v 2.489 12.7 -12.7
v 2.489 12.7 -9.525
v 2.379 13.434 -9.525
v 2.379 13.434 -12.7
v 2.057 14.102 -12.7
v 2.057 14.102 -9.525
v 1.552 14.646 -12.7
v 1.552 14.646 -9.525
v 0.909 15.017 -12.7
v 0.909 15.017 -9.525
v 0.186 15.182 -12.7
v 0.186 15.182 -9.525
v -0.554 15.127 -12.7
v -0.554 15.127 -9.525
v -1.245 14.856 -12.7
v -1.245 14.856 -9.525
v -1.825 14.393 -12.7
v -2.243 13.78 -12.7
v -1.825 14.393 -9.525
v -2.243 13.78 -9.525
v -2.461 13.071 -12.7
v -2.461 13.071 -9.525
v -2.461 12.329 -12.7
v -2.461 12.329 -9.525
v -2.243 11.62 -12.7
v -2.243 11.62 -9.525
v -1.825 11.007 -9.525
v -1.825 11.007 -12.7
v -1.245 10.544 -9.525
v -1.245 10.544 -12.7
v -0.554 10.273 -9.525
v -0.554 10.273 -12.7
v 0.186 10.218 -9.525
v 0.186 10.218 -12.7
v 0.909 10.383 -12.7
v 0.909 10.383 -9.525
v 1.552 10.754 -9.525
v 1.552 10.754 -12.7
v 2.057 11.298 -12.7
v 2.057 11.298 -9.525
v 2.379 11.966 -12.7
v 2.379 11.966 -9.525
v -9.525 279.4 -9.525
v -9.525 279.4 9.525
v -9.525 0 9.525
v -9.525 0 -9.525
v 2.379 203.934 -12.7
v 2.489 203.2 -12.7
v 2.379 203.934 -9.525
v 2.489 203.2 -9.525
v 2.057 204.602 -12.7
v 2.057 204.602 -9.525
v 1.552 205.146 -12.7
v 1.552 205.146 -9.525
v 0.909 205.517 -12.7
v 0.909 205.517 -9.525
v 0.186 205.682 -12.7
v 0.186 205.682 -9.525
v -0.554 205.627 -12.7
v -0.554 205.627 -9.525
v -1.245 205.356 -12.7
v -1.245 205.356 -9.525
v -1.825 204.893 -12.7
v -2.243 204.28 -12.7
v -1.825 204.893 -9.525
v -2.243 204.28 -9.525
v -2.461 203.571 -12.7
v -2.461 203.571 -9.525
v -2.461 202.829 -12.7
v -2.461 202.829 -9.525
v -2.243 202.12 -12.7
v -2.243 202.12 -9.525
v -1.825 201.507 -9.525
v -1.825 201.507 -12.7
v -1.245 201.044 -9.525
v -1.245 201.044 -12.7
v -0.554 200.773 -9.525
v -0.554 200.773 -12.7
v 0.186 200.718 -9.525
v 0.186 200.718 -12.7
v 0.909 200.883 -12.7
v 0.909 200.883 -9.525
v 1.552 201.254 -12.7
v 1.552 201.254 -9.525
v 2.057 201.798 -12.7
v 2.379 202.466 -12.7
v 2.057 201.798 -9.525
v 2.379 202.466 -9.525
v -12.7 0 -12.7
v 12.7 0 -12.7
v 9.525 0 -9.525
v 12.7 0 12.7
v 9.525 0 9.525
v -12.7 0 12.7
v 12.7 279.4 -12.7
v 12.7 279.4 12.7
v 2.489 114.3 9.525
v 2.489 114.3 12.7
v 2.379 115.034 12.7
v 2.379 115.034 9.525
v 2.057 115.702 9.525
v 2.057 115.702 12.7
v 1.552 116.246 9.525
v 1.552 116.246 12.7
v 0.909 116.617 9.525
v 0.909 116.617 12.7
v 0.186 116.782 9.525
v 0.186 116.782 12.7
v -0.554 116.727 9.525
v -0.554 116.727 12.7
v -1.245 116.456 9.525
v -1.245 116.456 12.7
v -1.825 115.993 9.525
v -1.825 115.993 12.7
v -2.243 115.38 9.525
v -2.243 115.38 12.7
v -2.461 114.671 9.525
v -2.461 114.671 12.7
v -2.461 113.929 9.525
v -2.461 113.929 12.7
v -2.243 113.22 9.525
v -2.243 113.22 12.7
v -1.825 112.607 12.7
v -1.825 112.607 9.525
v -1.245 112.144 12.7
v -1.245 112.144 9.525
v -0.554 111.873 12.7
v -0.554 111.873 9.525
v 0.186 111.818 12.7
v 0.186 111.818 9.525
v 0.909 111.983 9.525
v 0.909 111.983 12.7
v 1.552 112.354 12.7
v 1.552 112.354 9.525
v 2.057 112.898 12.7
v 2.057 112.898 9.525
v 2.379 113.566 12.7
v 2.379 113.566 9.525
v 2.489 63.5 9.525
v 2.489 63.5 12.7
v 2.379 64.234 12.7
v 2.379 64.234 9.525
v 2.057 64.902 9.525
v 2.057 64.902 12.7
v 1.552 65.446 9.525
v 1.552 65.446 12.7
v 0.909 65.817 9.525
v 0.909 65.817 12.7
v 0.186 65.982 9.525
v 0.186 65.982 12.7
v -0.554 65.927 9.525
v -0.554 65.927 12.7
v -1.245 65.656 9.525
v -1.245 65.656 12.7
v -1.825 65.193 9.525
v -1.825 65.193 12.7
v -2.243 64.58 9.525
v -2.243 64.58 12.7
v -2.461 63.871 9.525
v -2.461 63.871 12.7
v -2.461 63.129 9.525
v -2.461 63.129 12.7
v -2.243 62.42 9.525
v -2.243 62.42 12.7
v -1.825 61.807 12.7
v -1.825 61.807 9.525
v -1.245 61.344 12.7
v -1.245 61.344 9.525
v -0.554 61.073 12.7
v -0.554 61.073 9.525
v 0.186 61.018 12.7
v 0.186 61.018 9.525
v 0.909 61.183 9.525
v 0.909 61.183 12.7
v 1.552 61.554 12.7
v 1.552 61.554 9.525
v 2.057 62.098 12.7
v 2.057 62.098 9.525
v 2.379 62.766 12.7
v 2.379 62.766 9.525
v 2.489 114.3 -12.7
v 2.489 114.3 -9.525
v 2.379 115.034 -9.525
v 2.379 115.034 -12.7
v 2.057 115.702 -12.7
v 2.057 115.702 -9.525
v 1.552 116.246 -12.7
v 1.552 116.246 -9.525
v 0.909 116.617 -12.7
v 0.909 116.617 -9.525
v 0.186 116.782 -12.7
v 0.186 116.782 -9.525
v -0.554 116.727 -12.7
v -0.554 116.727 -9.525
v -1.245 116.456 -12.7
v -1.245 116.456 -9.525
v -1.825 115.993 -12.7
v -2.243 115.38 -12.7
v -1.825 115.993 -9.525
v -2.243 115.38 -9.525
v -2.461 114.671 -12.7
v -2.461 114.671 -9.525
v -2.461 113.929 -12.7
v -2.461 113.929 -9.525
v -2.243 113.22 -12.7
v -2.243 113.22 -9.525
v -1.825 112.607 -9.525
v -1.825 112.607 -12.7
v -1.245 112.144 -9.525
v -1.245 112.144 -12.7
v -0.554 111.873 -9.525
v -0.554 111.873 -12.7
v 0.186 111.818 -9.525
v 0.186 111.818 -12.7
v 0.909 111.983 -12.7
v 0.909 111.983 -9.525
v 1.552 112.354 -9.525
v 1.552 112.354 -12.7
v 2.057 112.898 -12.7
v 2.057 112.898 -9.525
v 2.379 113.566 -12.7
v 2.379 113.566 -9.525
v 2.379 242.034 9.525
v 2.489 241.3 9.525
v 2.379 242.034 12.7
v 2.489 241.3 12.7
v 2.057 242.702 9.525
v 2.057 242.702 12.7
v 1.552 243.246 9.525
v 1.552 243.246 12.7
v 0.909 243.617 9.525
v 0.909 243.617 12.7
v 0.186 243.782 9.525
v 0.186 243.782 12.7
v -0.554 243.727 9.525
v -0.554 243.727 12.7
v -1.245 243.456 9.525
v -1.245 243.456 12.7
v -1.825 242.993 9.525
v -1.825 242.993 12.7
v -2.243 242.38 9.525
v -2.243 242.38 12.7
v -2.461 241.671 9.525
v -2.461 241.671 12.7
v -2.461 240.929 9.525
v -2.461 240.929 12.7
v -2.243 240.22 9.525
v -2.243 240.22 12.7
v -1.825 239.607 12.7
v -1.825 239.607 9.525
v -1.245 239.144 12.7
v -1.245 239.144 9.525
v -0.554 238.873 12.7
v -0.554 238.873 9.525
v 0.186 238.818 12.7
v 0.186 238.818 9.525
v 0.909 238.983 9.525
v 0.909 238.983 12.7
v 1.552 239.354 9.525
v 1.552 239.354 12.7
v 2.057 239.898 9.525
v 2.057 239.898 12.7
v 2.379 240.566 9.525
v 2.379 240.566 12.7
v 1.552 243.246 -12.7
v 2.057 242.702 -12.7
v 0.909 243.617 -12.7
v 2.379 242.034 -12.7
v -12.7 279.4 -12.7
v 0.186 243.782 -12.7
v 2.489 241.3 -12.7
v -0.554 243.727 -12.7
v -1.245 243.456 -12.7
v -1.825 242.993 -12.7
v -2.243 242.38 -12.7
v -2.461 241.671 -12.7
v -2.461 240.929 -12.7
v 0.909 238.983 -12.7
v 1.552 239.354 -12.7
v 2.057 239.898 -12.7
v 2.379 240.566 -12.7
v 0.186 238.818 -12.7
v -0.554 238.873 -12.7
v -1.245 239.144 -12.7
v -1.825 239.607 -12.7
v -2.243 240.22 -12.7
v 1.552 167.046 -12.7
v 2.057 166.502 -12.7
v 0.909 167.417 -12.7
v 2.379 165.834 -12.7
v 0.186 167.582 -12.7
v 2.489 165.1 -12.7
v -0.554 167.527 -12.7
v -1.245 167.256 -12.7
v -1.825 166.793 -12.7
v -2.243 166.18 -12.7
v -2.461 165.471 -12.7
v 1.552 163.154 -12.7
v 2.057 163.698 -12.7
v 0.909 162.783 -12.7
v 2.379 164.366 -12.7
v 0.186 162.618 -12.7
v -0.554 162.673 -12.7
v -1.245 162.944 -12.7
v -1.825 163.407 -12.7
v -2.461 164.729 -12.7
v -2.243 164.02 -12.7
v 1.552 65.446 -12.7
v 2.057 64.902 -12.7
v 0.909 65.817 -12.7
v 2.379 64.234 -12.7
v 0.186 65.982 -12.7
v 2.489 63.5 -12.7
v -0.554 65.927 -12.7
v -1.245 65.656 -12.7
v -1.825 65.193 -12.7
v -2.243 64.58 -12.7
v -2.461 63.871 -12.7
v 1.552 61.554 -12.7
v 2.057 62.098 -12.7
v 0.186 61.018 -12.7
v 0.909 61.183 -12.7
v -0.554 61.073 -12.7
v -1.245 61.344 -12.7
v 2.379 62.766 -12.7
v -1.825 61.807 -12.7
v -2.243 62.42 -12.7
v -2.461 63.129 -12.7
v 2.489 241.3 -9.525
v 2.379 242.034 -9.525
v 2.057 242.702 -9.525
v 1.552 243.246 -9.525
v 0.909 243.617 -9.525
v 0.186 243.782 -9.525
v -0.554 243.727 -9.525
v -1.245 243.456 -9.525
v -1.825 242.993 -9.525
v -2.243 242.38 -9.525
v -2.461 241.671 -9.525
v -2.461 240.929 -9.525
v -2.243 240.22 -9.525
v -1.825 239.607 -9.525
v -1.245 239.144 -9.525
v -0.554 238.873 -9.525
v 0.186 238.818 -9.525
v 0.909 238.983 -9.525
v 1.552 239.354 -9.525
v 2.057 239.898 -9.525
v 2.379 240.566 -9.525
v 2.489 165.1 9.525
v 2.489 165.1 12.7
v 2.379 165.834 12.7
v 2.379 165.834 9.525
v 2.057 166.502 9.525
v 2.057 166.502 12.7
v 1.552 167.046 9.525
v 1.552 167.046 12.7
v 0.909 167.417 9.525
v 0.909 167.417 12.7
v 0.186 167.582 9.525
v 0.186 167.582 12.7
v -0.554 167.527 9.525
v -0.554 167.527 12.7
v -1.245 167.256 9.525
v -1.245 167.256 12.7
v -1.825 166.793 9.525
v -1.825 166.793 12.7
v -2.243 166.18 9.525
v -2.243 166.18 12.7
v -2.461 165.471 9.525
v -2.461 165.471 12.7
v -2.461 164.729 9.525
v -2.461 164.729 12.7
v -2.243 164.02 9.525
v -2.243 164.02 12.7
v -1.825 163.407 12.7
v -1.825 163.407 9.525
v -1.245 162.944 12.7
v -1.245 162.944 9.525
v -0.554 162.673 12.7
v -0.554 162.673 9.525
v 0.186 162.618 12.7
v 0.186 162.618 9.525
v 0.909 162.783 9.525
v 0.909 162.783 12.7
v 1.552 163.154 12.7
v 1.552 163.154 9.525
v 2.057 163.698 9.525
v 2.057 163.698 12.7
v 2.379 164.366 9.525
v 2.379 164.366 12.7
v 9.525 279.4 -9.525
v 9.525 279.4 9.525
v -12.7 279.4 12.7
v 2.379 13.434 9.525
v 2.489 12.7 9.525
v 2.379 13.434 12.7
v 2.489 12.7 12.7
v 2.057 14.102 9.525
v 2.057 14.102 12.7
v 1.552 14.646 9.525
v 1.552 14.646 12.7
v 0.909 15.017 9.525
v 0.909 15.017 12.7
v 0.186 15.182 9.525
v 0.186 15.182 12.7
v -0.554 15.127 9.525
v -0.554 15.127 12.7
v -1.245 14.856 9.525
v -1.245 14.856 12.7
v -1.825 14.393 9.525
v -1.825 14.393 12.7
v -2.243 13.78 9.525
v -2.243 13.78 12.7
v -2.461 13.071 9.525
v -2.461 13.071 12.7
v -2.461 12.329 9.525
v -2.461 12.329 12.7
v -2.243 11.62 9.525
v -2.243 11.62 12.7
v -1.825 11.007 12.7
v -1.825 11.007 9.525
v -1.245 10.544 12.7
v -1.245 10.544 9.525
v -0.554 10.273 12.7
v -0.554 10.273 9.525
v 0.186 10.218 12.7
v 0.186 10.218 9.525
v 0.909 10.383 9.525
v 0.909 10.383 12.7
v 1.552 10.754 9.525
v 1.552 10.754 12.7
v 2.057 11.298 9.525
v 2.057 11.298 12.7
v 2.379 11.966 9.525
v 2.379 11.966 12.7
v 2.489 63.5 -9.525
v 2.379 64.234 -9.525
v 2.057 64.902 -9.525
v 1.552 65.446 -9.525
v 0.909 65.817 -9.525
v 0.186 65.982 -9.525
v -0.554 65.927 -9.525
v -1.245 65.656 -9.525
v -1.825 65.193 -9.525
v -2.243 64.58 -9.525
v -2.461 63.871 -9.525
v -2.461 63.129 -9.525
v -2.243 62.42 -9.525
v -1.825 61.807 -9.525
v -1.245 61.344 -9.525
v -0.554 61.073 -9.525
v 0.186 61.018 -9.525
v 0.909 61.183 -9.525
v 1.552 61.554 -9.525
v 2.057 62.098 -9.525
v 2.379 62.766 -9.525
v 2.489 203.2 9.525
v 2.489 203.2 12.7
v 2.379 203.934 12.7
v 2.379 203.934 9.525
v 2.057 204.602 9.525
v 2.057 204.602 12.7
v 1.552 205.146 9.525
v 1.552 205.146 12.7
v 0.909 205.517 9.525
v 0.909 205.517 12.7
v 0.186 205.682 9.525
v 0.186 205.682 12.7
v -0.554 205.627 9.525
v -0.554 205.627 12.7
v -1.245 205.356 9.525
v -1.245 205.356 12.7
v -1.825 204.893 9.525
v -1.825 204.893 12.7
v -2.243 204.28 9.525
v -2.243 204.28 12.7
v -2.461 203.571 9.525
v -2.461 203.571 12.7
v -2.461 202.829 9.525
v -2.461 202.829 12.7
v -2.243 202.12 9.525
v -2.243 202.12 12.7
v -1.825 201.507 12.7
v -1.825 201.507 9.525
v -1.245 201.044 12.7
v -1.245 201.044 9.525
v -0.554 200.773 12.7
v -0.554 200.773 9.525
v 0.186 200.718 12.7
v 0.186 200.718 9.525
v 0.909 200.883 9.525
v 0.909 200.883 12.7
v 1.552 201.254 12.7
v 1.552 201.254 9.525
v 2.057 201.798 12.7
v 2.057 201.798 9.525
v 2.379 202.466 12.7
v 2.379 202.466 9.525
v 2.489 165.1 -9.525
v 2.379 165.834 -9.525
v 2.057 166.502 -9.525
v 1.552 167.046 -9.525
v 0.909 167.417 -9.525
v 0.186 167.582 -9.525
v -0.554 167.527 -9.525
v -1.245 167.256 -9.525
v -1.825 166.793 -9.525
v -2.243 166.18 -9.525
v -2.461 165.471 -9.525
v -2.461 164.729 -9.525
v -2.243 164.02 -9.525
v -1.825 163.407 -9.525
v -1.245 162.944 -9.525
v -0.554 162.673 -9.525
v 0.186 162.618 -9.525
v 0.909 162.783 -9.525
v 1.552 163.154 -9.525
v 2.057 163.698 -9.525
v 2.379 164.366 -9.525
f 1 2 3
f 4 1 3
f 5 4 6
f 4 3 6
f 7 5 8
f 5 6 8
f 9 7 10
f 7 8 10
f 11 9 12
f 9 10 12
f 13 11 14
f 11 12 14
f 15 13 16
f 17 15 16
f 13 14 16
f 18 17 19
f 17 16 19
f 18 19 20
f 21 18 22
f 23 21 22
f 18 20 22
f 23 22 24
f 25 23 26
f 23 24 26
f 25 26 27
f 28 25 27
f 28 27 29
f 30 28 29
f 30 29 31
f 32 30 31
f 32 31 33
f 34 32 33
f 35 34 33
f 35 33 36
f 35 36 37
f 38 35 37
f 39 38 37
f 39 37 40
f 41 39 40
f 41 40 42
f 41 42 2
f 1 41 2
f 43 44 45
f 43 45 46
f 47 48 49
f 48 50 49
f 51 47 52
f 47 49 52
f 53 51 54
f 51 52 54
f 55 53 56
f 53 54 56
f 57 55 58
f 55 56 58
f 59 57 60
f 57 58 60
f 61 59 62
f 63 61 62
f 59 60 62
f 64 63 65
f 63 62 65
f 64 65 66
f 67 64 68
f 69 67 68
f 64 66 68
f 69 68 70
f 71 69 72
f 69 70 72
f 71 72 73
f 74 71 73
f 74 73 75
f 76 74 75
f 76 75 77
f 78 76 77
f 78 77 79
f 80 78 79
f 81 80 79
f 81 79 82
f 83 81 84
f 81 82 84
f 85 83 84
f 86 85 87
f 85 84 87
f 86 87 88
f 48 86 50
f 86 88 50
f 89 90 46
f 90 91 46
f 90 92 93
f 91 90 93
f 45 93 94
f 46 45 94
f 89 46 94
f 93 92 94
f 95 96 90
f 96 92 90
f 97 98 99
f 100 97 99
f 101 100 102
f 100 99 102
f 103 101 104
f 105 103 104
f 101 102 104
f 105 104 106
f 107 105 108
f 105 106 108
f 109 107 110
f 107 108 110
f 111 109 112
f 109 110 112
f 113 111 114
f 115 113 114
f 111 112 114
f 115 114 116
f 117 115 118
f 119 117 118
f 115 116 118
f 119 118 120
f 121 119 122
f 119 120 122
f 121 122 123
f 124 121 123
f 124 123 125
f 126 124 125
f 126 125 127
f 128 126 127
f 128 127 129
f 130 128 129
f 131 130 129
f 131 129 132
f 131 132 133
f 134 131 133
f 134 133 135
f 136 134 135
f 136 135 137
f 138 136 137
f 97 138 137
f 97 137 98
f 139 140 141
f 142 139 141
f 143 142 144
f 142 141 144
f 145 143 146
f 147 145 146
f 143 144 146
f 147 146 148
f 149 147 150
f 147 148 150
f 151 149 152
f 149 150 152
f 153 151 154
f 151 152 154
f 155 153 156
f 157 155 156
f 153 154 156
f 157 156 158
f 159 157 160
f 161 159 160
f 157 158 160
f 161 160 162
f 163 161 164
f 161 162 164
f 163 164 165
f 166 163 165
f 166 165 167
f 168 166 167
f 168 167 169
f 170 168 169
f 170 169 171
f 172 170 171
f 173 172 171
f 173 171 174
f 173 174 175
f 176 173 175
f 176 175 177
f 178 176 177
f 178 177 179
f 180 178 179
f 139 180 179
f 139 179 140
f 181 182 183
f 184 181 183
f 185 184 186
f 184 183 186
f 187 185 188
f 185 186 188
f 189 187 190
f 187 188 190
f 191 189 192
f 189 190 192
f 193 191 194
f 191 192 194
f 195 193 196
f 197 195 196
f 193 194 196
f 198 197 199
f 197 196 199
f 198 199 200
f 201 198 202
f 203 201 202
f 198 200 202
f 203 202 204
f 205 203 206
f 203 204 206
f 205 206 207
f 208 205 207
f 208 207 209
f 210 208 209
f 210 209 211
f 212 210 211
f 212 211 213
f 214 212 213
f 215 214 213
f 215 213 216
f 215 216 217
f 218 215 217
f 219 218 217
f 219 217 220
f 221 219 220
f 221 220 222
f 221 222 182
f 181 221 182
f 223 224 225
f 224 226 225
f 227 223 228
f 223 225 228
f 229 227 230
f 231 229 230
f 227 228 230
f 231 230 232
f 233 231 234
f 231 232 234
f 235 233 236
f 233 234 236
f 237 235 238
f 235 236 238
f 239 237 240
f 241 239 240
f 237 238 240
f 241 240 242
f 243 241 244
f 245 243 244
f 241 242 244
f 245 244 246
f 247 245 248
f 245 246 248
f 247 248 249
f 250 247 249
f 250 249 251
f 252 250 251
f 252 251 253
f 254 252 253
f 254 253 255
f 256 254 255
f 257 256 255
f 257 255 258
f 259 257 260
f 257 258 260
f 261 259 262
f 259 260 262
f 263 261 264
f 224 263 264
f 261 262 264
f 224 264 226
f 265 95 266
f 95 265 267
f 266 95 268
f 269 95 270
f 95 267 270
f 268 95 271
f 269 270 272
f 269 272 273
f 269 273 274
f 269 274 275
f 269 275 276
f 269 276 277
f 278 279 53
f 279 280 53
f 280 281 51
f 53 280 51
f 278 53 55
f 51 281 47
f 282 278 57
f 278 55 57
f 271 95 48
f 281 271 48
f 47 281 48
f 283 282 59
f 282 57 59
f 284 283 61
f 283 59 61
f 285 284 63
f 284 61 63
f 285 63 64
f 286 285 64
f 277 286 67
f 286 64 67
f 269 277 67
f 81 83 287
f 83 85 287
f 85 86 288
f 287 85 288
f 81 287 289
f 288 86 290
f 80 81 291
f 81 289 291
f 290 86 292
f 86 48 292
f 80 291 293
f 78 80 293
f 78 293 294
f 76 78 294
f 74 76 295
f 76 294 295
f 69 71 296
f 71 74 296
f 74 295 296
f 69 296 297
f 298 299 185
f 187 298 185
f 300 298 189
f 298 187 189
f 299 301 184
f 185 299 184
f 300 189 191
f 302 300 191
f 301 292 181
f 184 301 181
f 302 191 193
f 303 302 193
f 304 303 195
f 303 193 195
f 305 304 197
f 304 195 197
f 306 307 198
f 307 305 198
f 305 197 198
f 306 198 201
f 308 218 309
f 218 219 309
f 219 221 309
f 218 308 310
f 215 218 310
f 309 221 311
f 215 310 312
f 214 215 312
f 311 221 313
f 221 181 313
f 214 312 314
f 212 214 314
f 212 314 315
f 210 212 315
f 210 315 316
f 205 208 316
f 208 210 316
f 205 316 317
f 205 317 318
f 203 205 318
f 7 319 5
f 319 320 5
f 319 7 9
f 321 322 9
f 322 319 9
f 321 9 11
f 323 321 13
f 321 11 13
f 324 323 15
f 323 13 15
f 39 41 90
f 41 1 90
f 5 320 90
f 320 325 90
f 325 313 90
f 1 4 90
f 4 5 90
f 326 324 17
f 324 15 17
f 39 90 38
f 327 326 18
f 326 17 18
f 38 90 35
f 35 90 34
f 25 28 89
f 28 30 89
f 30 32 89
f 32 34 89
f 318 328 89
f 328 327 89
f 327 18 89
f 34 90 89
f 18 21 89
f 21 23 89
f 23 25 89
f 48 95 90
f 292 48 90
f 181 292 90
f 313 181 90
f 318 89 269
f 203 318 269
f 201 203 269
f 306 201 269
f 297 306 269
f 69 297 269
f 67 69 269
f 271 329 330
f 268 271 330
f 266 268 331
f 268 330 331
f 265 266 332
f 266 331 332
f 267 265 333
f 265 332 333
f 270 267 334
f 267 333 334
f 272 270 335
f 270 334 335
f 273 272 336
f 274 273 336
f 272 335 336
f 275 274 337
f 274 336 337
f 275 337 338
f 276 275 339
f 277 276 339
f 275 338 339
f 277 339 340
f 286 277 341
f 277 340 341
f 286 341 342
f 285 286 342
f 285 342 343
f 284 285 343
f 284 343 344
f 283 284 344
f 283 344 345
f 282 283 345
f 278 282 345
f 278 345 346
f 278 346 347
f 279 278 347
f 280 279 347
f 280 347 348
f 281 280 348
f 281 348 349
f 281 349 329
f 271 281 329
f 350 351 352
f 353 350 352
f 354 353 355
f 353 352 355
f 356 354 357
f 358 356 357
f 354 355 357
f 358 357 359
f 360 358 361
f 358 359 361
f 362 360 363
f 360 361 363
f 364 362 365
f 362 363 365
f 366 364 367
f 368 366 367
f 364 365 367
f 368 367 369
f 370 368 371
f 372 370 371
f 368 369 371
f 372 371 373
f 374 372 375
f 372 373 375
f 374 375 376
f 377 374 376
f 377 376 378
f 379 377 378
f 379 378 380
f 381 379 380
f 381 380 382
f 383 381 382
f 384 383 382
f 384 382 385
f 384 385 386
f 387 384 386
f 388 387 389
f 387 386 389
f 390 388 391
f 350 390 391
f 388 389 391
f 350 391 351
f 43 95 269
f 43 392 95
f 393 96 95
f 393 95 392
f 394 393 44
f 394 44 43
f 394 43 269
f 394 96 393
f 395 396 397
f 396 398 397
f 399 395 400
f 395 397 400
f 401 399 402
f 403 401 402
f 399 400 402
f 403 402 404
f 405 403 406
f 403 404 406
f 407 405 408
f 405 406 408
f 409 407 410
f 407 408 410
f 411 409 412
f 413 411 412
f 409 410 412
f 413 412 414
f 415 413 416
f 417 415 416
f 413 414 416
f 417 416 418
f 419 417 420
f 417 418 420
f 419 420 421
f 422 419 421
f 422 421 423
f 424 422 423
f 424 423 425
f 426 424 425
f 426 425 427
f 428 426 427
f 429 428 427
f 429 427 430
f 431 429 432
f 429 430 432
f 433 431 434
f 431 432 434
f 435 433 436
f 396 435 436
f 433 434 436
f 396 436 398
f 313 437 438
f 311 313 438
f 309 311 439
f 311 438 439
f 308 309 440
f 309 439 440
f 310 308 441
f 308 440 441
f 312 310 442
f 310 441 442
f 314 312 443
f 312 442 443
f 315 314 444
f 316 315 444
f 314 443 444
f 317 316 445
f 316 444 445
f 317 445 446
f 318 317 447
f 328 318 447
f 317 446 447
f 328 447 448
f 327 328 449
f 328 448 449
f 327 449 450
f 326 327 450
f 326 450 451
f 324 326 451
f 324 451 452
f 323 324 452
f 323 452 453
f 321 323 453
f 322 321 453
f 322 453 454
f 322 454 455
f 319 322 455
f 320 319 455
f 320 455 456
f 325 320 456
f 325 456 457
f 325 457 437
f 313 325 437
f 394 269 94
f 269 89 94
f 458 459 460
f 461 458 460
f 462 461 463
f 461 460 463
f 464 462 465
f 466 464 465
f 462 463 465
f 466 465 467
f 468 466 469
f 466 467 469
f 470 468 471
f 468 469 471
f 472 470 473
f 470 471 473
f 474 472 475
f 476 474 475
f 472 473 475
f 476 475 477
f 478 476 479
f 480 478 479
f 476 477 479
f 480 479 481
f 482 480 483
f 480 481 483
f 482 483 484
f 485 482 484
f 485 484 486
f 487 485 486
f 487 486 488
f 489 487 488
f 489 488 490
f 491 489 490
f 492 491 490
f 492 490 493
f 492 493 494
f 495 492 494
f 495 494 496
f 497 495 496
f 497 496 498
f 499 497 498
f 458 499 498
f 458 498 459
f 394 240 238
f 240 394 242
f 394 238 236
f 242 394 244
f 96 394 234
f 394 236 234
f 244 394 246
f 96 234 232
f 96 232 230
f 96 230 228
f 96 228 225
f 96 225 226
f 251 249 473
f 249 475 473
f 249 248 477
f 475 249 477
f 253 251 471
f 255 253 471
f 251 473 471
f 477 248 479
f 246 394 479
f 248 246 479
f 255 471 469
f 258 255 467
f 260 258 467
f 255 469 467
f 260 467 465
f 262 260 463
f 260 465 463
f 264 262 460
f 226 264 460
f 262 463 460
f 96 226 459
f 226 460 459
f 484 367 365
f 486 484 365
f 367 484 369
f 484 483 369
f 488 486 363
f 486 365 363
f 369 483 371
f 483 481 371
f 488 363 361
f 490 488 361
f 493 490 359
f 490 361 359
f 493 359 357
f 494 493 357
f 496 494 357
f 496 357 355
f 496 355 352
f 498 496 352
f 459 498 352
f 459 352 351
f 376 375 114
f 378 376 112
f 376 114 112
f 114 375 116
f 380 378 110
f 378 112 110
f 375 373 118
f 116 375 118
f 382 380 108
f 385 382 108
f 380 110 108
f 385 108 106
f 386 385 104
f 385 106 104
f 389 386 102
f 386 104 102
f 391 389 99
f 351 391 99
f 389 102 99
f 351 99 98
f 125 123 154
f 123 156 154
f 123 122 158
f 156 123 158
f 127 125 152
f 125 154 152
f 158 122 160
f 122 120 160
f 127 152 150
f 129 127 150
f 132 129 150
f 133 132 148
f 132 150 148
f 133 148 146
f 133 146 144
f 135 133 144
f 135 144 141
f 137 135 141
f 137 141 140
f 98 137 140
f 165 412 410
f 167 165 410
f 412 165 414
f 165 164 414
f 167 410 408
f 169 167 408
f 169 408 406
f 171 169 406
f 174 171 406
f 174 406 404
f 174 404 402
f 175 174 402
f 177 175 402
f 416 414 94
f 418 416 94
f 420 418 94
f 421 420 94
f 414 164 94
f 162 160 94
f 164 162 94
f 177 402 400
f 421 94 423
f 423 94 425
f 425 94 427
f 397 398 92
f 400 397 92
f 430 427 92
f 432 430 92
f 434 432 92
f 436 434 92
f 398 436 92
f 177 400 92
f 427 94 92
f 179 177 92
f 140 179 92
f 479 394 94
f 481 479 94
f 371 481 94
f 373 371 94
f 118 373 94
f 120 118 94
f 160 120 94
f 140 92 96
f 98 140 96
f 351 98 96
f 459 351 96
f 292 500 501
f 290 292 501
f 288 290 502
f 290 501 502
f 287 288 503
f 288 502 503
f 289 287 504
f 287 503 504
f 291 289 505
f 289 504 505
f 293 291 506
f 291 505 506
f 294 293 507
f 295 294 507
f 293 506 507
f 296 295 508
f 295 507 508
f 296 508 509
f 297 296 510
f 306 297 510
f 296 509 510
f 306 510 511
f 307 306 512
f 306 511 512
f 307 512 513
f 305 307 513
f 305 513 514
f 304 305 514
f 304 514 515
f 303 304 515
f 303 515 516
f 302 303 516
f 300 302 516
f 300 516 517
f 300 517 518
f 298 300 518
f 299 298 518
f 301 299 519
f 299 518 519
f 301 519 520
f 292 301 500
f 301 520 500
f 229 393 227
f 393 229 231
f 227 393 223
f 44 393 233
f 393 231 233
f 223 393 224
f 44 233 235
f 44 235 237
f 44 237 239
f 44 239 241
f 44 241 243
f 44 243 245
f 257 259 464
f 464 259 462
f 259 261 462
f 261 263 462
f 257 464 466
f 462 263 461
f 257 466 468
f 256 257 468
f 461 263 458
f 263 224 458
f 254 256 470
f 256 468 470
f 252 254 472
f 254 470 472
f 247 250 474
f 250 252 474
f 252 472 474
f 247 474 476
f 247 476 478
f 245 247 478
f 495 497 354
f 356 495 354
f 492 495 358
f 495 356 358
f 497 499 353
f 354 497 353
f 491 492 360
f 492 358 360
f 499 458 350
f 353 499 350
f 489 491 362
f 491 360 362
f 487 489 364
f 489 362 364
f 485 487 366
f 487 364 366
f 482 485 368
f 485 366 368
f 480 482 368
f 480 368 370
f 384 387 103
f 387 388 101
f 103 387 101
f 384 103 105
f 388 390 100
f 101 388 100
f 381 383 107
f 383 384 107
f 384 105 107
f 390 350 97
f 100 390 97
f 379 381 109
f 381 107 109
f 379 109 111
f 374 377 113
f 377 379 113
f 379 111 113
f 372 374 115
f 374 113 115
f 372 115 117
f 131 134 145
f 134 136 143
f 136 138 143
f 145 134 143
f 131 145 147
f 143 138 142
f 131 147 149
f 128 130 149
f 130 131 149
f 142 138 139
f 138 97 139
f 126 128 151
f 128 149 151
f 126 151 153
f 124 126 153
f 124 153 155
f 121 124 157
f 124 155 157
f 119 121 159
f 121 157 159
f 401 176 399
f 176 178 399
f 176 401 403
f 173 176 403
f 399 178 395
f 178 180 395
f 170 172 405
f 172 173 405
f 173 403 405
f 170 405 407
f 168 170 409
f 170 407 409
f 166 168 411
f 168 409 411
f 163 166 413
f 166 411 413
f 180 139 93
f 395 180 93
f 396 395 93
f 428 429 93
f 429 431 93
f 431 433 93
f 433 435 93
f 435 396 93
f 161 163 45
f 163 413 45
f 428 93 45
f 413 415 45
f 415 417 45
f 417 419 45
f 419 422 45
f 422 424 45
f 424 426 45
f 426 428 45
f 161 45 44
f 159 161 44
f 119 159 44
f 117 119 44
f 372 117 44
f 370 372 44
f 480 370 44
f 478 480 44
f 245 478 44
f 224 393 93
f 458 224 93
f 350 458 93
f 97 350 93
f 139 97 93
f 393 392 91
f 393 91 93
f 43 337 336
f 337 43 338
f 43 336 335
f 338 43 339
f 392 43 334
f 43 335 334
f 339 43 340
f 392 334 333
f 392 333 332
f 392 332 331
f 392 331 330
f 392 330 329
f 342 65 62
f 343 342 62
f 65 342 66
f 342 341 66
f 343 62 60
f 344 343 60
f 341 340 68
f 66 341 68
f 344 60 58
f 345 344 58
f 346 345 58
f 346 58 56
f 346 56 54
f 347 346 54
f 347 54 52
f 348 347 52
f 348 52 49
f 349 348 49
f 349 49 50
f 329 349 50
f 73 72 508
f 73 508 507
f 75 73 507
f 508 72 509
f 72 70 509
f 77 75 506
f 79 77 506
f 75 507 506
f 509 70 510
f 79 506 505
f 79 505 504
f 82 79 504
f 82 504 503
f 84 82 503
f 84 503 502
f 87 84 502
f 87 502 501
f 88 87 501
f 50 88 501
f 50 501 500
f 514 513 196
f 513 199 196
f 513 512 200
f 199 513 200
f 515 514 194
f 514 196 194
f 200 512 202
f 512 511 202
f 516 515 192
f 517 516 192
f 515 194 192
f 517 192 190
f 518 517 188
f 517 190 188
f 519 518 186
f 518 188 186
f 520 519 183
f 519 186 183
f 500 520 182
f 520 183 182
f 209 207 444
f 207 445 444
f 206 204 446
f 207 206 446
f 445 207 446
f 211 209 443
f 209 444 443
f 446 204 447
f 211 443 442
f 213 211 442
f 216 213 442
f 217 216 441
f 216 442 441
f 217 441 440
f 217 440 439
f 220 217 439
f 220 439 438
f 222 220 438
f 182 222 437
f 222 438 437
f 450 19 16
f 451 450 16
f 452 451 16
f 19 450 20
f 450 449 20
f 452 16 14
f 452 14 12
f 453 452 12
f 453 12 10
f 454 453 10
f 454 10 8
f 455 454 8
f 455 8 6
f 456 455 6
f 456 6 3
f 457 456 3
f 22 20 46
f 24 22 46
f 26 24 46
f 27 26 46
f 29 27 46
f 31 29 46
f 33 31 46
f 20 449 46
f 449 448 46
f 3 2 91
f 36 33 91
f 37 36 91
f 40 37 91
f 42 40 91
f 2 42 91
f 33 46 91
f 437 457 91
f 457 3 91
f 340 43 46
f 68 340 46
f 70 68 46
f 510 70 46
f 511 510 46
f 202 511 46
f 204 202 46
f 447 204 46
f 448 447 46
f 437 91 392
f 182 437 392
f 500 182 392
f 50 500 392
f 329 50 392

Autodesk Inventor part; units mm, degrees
ref_plane "YZ Plane" through (0, 0, 0) normal (1, 0, 0) x (0, 1, 0)
ref_plane "XZ Plane" through (0, 0, 0) normal (0, 1, 0) x (-1, 0, 0)
ref_plane "XY Plane" through (0, 0, 0) normal (0, 0, 1) x (1, 0, 0)
sketch "Sketch1" plane through (0, 0, 0) normal (0, 1, 0) x (-1, 0, 0)
  line L0 (-12.7, -12.7) -> (12.7, -12.7)
  line L1 (12.7, -12.7) -> (12.7, 12.7)
  line L2 (12.7, 12.7) -> (-12.7, 12.7)
  line L3 (-12.7, 12.7) -> (-12.7, -12.7)
  line L4 (-12.7, -12.7) -> (12.7, 12.7) construction
  line L5 (12.7, -12.7) -> (-12.7, 12.7) construction
  line L6 (9.525, 9.525) -> (9.525, -9.525)
  line L7 (9.525, -9.525) -> (-9.525, -9.525)
  line L8 (-9.525, -9.525) -> (-9.525, 9.525)
  line L9 (-9.525, 9.525) -> (9.525, 9.525)
  point P0 (0, 0)
  dimension "d0" = 25.4
  dimension "d1" = 25.4
  dimension "d2" = 3.175
extrude "Extrusion1" add sketch "Sketch1" along normal blind 279.4
sketch "Sketch2" plane through (-12.7, 0, 12.7) normal (0, 0, 1) x (1, 0, 0)
  line L0 (0, 0) -> (25.4, 0) projected
  line L1 (25.4, 0) -> (25.4, 279.4) projected
  line L2 (0, 279.4) -> (25.4, 279.4) projected
  line L3 (0, 0) -> (0, 279.4) projected
  circle A0 centre (12.7, 241.3) radius 2.4892
  circle A1 centre (12.7, 203.2) radius 2.4892
  circle A2 centre (12.7, 165.1) radius 2.4892
  circle A3 centre (12.7, 114.3) radius 2.4892
  circle A4 centre (12.7, 63.5) radius 2.4892
  circle A5 centre (12.7, 12.7) radius 2.4892
  point P0 (12.7, 0)
  point P1 (12.7, 279.4)
  dimension "d7" = 4.9784
  dimension "d8" = 38.1
  dimension "d11" = 38.1
  dimension "d18" = 50.8
extrude "Extrusion2" cut sketch "Sketch2" against normal blind 25.4 contours A0 | A1 | A2 | A3 | A4 | A5
properties part number "STRU_026_Bryan_11in" material "Aluminum 6061"
